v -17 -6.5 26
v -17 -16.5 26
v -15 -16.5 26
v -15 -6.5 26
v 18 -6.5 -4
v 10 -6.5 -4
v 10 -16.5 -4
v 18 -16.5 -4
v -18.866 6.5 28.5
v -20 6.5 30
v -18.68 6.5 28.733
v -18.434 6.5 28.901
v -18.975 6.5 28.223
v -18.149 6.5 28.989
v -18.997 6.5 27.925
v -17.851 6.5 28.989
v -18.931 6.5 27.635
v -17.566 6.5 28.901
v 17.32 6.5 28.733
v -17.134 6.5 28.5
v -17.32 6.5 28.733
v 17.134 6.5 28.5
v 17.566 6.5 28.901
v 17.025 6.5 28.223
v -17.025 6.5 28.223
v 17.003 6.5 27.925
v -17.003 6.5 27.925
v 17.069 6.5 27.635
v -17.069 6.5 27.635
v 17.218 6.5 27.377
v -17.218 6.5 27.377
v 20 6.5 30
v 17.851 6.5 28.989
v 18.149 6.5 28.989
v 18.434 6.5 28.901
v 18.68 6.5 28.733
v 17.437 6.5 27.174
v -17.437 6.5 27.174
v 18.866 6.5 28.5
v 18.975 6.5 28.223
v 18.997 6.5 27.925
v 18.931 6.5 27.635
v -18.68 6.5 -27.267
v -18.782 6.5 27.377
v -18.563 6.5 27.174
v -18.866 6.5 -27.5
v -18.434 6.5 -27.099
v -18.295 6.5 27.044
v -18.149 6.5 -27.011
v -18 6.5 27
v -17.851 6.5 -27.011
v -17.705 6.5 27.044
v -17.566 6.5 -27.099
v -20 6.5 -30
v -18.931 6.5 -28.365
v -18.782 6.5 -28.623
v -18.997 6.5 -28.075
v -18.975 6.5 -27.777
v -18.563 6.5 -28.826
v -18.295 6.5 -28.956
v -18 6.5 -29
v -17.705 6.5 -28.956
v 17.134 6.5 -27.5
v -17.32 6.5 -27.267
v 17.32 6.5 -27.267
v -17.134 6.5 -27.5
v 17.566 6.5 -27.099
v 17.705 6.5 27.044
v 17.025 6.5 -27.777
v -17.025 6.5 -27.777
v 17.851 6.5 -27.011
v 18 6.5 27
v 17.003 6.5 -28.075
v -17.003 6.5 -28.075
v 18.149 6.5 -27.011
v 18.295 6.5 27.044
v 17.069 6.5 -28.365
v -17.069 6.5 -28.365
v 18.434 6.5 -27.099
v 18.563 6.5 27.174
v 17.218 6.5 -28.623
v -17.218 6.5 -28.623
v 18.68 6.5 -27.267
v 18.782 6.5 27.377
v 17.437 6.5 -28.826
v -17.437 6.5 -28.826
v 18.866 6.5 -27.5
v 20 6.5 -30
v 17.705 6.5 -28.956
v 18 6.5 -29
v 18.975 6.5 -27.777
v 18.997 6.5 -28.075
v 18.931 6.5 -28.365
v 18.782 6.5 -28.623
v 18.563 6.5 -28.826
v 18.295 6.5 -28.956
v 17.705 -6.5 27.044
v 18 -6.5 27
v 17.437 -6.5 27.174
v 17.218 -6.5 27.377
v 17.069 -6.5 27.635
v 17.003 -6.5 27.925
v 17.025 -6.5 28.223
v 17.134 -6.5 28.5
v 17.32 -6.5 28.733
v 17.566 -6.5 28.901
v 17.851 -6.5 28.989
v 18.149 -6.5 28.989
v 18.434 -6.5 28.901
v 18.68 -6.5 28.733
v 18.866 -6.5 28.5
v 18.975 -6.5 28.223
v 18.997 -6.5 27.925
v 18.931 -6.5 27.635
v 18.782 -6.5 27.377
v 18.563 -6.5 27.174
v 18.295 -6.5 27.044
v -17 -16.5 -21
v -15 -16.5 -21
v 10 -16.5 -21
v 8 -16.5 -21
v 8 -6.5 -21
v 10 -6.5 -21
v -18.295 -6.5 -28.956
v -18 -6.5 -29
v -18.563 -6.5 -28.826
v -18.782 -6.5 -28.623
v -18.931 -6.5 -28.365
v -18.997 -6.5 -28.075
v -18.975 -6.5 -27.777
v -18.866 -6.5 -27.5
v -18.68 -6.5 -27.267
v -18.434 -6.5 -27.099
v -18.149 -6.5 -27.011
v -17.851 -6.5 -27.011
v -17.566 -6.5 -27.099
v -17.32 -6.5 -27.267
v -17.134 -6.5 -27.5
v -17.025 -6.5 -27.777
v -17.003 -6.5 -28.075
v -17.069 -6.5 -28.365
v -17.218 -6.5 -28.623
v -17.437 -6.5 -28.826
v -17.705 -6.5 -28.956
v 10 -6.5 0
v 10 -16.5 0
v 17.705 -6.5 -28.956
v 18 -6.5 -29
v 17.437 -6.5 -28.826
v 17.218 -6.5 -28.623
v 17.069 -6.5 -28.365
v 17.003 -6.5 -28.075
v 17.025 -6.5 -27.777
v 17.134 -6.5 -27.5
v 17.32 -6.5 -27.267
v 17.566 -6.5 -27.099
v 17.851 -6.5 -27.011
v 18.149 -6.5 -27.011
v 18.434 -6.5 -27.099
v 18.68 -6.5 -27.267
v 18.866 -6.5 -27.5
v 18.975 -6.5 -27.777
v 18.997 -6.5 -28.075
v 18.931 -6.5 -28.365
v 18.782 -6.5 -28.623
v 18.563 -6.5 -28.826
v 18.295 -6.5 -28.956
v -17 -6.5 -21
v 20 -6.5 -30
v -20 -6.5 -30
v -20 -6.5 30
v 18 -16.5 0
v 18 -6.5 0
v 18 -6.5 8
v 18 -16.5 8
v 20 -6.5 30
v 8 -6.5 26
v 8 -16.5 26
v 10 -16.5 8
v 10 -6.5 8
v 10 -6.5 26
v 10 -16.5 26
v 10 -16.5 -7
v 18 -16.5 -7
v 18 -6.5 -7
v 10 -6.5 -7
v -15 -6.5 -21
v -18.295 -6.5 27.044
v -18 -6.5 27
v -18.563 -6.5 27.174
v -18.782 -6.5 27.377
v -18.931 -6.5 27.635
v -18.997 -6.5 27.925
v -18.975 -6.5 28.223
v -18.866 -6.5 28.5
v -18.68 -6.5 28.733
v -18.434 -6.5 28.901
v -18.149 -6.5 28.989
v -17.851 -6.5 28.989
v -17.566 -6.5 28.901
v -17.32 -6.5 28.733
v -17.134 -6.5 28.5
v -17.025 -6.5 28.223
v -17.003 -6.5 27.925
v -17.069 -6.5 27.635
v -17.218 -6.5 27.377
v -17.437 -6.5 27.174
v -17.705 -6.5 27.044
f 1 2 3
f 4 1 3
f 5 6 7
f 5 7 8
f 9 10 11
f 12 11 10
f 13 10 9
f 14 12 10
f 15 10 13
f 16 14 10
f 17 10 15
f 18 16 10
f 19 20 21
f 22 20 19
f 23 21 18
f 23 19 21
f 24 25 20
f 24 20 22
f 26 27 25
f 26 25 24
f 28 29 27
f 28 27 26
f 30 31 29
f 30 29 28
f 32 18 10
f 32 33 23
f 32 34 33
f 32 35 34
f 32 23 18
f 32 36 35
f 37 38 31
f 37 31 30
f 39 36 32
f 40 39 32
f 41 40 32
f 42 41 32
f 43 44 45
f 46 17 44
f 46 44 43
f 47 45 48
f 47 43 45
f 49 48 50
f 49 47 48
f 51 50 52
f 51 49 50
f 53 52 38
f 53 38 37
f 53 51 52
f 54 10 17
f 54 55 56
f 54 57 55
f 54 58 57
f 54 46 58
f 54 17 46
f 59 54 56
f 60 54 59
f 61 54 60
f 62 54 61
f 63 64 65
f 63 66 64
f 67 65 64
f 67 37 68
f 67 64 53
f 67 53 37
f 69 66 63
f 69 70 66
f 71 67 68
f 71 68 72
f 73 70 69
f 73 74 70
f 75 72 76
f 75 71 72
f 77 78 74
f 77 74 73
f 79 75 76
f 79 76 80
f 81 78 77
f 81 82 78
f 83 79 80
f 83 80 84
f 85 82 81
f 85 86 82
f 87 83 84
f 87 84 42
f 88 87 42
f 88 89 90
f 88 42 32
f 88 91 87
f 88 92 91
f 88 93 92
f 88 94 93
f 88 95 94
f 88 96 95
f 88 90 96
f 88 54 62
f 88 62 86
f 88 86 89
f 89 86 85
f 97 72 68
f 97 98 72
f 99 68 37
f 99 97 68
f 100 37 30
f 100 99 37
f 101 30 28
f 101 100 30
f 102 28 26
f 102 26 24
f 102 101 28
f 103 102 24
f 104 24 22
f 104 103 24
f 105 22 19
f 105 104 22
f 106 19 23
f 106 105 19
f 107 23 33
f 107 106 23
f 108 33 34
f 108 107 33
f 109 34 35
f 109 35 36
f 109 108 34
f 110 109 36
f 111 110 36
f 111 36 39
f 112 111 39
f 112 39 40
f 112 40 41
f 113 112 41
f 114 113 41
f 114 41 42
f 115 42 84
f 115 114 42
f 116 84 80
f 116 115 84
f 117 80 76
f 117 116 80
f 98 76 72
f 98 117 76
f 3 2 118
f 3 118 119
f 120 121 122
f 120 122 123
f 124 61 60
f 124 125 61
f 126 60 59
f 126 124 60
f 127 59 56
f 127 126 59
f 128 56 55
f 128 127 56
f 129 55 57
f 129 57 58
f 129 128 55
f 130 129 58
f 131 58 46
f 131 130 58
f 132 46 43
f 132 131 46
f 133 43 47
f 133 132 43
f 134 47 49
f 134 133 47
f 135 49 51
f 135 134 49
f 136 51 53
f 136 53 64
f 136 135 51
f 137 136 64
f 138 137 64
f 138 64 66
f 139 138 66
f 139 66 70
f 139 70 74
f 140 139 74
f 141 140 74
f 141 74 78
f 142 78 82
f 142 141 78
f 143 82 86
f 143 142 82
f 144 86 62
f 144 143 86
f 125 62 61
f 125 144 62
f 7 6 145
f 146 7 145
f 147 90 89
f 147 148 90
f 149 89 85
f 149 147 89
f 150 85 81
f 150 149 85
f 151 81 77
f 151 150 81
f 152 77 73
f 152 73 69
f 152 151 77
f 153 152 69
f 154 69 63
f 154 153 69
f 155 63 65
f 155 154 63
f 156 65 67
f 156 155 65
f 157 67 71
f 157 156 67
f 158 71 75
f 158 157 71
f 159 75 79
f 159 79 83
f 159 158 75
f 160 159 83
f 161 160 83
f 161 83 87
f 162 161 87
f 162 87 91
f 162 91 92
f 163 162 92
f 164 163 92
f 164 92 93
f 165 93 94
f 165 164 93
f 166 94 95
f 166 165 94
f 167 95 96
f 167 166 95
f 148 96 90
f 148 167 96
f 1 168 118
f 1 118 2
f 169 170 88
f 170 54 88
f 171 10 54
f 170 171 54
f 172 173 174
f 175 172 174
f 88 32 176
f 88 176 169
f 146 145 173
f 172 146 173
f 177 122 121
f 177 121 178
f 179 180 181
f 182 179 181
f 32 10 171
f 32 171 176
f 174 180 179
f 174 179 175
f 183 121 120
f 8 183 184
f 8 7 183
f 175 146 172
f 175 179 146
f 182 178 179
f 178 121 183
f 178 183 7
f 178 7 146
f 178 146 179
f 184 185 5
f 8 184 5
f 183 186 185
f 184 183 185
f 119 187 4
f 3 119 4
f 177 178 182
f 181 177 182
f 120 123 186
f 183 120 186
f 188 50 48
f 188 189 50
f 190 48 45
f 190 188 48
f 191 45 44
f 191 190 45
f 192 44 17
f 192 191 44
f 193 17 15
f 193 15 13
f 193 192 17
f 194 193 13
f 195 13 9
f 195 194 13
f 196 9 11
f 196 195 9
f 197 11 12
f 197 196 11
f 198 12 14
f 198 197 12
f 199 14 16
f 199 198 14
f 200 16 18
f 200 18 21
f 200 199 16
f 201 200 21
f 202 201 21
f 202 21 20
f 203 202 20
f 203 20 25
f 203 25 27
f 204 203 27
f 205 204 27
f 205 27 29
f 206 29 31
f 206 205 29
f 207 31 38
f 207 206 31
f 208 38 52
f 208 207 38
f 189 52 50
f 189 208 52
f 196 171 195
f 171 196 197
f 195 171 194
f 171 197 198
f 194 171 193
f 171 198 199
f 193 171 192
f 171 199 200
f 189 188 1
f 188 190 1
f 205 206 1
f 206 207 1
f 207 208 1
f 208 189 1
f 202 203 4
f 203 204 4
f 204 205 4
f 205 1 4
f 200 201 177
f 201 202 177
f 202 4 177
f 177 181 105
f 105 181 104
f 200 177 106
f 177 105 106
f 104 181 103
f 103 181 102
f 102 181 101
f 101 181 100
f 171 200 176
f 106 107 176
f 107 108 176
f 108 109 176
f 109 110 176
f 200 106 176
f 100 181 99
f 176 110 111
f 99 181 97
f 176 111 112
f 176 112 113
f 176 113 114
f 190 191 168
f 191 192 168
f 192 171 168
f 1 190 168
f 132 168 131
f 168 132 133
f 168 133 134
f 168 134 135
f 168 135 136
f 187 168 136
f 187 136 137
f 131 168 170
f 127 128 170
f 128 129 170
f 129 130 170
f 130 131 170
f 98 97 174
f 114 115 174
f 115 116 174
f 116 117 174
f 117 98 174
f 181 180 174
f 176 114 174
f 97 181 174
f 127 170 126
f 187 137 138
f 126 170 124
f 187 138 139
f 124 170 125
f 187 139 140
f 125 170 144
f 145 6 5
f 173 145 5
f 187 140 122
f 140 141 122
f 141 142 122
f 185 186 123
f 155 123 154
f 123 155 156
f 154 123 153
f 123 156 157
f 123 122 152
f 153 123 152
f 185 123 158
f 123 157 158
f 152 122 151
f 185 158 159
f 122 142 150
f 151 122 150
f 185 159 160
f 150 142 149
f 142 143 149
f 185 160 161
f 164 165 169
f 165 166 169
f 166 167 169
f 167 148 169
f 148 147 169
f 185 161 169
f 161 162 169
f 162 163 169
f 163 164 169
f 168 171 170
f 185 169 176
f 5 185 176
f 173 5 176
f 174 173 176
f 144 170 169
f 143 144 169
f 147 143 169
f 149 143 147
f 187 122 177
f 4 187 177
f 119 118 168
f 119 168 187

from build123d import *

# Parameters (mm, degrees)
ESQUISSE1_W        = 40
ESQUISSE1_H        = 60
ESQUISSE1_R        = 1
BOSS_EXTRU_1_DEPTH = 6.5
ESQUISSE3_W        = 8
ESQUISSE3_H        = 8
ESQUISSE3_H_2      = 3
ESQUISSE3_W_2      = 2
ESQUISSE3_H_3      = 47
BOSS_EXTRU_2_DEPTH = 10


with BuildPart() as part:
    # Esquisse1 → Boss.-Extru.1 (new, symmetric)
    with BuildSketch(Plane(origin=(0, 0, 0), x_dir=(1, 0, 0), z_dir=(0, 1, 0))):
        Rectangle(ESQUISSE1_W, ESQUISSE1_H)
        with Locations(Location((-18, 28, 0), (0, 0, 90))):
            Circle(ESQUISSE1_R, mode=Mode.SUBTRACT)
        with Locations(Location((18, 28, 0), (0, 0, 90))):
            Circle(ESQUISSE1_R, mode=Mode.SUBTRACT)
        with Locations(Location((18, -28, 0), (0, 0, 90))):
            Circle(ESQUISSE1_R, mode=Mode.SUBTRACT)
        with Locations(Location((-18, -28, 0), (0, 0, 90))):
            Circle(ESQUISSE1_R, mode=Mode.SUBTRACT)
    extrude(amount=BOSS_EXTRU_1_DEPTH, both=True)

    # Esquisse3 → Boss.-Extru.2 (add)
    with BuildSketch(Plane.XZ.offset(6.5)):
        with Locations((14, 4)):
            Rectangle(ESQUISSE3_W, ESQUISSE3_H)
        with Locations((14, -5.5)):
            Rectangle(ESQUISSE3_W, ESQUISSE3_H_2)
        with Locations((9, 2.5)):
            Rectangle(ESQUISSE3_W_2, ESQUISSE3_H_3)
        with Locations((-16, 2.5)):
            Rectangle(ESQUISSE3_W_2, ESQUISSE3_H_3)
    extrude(amount=BOSS_EXTRU_2_DEPTH)


solid = part.part
